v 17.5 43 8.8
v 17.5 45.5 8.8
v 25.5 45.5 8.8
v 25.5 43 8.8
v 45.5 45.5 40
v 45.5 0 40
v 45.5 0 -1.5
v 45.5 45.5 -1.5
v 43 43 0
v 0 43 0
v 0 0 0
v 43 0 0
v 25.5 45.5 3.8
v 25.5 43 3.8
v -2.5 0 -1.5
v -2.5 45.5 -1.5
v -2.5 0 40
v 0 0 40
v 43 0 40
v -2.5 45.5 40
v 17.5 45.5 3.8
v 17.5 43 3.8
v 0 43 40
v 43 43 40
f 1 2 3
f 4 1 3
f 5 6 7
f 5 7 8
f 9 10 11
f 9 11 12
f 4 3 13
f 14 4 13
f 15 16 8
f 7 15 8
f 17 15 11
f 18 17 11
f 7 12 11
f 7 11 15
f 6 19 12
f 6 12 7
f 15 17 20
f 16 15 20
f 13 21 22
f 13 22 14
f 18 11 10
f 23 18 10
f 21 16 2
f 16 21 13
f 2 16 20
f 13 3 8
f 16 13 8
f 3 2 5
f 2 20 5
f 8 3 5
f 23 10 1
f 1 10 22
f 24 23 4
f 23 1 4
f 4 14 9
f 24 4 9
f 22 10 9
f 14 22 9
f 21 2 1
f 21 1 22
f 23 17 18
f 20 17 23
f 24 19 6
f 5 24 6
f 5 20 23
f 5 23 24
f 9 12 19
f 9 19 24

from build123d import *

# Parameters (mm, degrees)
ESQUISSE1_W             = 43
ESQUISSE1_H             = 43
BOSS_EXTRU_1_DEPTH      = 40
ESQUISSE2_W             = 48
ESQUISSE2_H             = 48
BOSS_EXTRU_2_DEPTH      = 1.5
ENL_V_MAT_EXTRU_3_REACH = 50
ESQUISSE5_W             = 8
ESQUISSE5_H             = 5
ENL_V_MAT_EXTRU_4_REACH = 43.5
ESQUISSE6_W             = 54.781223227
ESQUISSE6_H             = 3.078773465


with BuildPart() as part:
    # Esquisse1 → Boss.-Extru.1 (new body)
    with BuildSketch(Plane.XY):
        Polygon((-2.5, 43), (-2.5, -2.5), (0, -2.5), (45.5, -2.5), (45.5, 43), (45.5, 45.5), (-2.5, 45.5), align=None)
        with Locations((21.5, 21.5)):
            Rectangle(ESQUISSE1_W, ESQUISSE1_H, mode=Mode.SUBTRACT)
    extrude(amount=BOSS_EXTRU_1_DEPTH)

    # Esquisse2 → Boss.-Extru.2 (add)
    with BuildSketch(Plane.XY):
        with Locations((21.5, 21.5)):
            Rectangle(ESQUISSE2_W, ESQUISSE2_H)
    extrude(amount=-BOSS_EXTRU_2_DEPTH)

    # Esquisse5 → Enlèv. mat.-Extru.3 (cut, up to next)
    with BuildSketch(Plane(origin=(0, 45.5, 0), x_dir=(1, 0, 0), z_dir=(0, 1, 0)), mode=Mode.PRIVATE) as enl_v_mat_extru_3_sk1:
        with Locations((21.5, -6.3)):
            Rectangle(ESQUISSE5_W, ESQUISSE5_H)
    enl_v_mat_extru_3_tool1 = extrude(enl_v_mat_extru_3_sk1.sketch, amount=-ENL_V_MAT_EXTRU_3_REACH, mode=Mode.PRIVATE) & part.part
    add(enl_v_mat_extru_3_tool1.solids().sort_by_distance((21.5, 45.5, 6.3))[0], mode=Mode.SUBTRACT)

    # Esquisse6 → Enlèv. mat.-Extru.4 (cut, up to next)
    with BuildSketch(Plane.XY.offset(40), mode=Mode.PRIVATE) as enl_v_mat_extru_4_sk1:
        with Locations((23.162986277, -1.539386733)):
            Rectangle(ESQUISSE6_W, ESQUISSE6_H)
    enl_v_mat_extru_4_tool1 = extrude(enl_v_mat_extru_4_sk1.sketch, amount=-ENL_V_MAT_EXTRU_4_REACH, mode=Mode.PRIVATE) & part.part
    add(enl_v_mat_extru_4_tool1.solids().sort_by_distance((23.162986, -1.539387, 40))[0], mode=Mode.SUBTRACT)


solid = part.part
